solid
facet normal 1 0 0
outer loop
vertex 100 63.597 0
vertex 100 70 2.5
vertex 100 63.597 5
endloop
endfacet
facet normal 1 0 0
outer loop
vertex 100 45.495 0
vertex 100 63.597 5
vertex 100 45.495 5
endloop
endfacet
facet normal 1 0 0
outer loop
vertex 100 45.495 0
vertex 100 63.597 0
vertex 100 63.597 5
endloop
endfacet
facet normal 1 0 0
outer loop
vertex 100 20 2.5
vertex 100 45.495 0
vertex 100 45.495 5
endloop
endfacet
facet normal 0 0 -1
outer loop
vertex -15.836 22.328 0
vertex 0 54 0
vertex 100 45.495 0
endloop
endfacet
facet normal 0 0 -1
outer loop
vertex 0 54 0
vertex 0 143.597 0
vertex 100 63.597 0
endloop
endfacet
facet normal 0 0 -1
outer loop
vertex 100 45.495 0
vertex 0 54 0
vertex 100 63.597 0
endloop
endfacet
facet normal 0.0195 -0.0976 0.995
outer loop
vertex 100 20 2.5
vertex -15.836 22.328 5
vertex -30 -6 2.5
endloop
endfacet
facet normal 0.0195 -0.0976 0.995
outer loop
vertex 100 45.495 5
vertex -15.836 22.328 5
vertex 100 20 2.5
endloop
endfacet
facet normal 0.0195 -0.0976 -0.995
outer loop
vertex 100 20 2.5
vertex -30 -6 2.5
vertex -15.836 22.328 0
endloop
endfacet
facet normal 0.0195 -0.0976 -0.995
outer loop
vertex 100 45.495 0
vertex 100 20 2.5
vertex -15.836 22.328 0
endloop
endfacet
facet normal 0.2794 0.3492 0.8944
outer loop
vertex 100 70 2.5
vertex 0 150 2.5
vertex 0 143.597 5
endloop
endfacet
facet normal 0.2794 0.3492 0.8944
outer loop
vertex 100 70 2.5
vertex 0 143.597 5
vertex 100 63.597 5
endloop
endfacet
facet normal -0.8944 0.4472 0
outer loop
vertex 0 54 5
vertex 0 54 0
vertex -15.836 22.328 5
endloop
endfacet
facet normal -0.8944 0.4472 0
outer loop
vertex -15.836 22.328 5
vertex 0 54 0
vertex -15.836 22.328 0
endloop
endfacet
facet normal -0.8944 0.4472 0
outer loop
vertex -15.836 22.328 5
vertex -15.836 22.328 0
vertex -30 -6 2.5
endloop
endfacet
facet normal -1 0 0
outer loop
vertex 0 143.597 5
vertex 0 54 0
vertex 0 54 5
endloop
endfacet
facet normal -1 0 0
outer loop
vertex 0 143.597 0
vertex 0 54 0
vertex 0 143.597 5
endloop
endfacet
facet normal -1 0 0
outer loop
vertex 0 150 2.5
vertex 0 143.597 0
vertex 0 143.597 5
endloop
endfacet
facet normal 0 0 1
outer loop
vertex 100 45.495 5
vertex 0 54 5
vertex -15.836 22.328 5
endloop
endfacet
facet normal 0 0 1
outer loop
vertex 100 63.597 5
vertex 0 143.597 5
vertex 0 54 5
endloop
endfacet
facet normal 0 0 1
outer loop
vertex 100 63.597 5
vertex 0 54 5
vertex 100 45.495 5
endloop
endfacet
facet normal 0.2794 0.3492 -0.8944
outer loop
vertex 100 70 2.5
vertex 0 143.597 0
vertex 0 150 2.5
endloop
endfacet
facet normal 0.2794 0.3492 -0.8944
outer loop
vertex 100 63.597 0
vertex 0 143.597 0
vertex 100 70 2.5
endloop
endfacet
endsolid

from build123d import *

# Parameters (mm, degrees)
BOSS_EXTRUDE1_DEPTH = 5
CHAMFER6_SIZE       = 5
CHAMFER6_SIZE2      = 2.5
CHAMFER7_SIZE2      = 5
CHAMFER7_SIZE       = 2.5
CHAMFER8_SIZE       = 2.5
CHAMFER8_SIZE2      = 25
CHAMFER9_SIZE       = 2.5
CHAMFER9_SIZE_2     = 25


# Some blends are built 0.0001 mm under size
with BuildPart() as part:
    # Sketch1 → Boss-Extrude1 (new body)
    with BuildSketch(Plane.XY):
        Polygon((-30, -6), (0, 0), (0, 54), align=None)
        Polygon((100, 20), (0, 0), (0, 150), (100, 70), align=None)
    extrude(amount=BOSS_EXTRUDE1_DEPTH)

    # Chamfer6
    chamfer6_edges = [part.edges().sort_by_distance(p)[0] for p in [
        (50, 110, 5),
    ]]
    chamfer6_side = [part.faces().sort_by_distance(p)[0] for p in [
        (37.795251311, 59.015726179, 5),
    ]]
    chamfer(chamfer6_edges, length=CHAMFER6_SIZE, length2=CHAMFER6_SIZE2, reference=chamfer6_side[0])

    # Chamfer7
    chamfer7_edges = [part.edges().sort_by_distance(p)[0] for p in [
        (50, 110, 0),
    ]]
    chamfer7_side = [part.faces().sort_by_distance(p)[0] for p in [
        (50, 110, 0.05),
    ]]
    chamfer(chamfer7_edges, length=CHAMFER7_SIZE - 0.0001, length2=CHAMFER7_SIZE2 - 0.0001, reference=chamfer7_side[0])  # a hair under: the kernel refuses the full size

    # Chamfer8
    chamfer8_edges = [part.edges().sort_by_distance(p)[0] for p in [
        (35, 7, 5),
    ]]
    chamfer8_side = [part.faces().sort_by_distance(p)[0] for p in [
        (35, 7, 2.5),
    ]]
    chamfer(chamfer8_edges, length=CHAMFER8_SIZE, length2=CHAMFER8_SIZE2, reference=chamfer8_side[0])

    # Chamfer9
    # the kernel refuses this chamfer: 25, 2.5 mm, written as the material it takes off along each edge
    with BuildSketch(Plane(origin=(-93.726044684, -18.745208937, 0), x_dir=(0.07010860495922276, -0.3505430247961141, 0.933918824779468), z_dir=(0.9805806756909202, 0.19611613513818388, 0))) as chamfer9_piece_1:
        Polygon((CHAMFER9_SIZE * 0.933918824779, -CHAMFER9_SIZE * 0.357485144758), (-CHAMFER9_SIZE_2 * 0.357485144758, -CHAMFER9_SIZE_2 * 0.933918824779), (0, 0), align=None)
    extrude(amount=262.550645501, mode=Mode.SUBTRACT)


solid = part.part
